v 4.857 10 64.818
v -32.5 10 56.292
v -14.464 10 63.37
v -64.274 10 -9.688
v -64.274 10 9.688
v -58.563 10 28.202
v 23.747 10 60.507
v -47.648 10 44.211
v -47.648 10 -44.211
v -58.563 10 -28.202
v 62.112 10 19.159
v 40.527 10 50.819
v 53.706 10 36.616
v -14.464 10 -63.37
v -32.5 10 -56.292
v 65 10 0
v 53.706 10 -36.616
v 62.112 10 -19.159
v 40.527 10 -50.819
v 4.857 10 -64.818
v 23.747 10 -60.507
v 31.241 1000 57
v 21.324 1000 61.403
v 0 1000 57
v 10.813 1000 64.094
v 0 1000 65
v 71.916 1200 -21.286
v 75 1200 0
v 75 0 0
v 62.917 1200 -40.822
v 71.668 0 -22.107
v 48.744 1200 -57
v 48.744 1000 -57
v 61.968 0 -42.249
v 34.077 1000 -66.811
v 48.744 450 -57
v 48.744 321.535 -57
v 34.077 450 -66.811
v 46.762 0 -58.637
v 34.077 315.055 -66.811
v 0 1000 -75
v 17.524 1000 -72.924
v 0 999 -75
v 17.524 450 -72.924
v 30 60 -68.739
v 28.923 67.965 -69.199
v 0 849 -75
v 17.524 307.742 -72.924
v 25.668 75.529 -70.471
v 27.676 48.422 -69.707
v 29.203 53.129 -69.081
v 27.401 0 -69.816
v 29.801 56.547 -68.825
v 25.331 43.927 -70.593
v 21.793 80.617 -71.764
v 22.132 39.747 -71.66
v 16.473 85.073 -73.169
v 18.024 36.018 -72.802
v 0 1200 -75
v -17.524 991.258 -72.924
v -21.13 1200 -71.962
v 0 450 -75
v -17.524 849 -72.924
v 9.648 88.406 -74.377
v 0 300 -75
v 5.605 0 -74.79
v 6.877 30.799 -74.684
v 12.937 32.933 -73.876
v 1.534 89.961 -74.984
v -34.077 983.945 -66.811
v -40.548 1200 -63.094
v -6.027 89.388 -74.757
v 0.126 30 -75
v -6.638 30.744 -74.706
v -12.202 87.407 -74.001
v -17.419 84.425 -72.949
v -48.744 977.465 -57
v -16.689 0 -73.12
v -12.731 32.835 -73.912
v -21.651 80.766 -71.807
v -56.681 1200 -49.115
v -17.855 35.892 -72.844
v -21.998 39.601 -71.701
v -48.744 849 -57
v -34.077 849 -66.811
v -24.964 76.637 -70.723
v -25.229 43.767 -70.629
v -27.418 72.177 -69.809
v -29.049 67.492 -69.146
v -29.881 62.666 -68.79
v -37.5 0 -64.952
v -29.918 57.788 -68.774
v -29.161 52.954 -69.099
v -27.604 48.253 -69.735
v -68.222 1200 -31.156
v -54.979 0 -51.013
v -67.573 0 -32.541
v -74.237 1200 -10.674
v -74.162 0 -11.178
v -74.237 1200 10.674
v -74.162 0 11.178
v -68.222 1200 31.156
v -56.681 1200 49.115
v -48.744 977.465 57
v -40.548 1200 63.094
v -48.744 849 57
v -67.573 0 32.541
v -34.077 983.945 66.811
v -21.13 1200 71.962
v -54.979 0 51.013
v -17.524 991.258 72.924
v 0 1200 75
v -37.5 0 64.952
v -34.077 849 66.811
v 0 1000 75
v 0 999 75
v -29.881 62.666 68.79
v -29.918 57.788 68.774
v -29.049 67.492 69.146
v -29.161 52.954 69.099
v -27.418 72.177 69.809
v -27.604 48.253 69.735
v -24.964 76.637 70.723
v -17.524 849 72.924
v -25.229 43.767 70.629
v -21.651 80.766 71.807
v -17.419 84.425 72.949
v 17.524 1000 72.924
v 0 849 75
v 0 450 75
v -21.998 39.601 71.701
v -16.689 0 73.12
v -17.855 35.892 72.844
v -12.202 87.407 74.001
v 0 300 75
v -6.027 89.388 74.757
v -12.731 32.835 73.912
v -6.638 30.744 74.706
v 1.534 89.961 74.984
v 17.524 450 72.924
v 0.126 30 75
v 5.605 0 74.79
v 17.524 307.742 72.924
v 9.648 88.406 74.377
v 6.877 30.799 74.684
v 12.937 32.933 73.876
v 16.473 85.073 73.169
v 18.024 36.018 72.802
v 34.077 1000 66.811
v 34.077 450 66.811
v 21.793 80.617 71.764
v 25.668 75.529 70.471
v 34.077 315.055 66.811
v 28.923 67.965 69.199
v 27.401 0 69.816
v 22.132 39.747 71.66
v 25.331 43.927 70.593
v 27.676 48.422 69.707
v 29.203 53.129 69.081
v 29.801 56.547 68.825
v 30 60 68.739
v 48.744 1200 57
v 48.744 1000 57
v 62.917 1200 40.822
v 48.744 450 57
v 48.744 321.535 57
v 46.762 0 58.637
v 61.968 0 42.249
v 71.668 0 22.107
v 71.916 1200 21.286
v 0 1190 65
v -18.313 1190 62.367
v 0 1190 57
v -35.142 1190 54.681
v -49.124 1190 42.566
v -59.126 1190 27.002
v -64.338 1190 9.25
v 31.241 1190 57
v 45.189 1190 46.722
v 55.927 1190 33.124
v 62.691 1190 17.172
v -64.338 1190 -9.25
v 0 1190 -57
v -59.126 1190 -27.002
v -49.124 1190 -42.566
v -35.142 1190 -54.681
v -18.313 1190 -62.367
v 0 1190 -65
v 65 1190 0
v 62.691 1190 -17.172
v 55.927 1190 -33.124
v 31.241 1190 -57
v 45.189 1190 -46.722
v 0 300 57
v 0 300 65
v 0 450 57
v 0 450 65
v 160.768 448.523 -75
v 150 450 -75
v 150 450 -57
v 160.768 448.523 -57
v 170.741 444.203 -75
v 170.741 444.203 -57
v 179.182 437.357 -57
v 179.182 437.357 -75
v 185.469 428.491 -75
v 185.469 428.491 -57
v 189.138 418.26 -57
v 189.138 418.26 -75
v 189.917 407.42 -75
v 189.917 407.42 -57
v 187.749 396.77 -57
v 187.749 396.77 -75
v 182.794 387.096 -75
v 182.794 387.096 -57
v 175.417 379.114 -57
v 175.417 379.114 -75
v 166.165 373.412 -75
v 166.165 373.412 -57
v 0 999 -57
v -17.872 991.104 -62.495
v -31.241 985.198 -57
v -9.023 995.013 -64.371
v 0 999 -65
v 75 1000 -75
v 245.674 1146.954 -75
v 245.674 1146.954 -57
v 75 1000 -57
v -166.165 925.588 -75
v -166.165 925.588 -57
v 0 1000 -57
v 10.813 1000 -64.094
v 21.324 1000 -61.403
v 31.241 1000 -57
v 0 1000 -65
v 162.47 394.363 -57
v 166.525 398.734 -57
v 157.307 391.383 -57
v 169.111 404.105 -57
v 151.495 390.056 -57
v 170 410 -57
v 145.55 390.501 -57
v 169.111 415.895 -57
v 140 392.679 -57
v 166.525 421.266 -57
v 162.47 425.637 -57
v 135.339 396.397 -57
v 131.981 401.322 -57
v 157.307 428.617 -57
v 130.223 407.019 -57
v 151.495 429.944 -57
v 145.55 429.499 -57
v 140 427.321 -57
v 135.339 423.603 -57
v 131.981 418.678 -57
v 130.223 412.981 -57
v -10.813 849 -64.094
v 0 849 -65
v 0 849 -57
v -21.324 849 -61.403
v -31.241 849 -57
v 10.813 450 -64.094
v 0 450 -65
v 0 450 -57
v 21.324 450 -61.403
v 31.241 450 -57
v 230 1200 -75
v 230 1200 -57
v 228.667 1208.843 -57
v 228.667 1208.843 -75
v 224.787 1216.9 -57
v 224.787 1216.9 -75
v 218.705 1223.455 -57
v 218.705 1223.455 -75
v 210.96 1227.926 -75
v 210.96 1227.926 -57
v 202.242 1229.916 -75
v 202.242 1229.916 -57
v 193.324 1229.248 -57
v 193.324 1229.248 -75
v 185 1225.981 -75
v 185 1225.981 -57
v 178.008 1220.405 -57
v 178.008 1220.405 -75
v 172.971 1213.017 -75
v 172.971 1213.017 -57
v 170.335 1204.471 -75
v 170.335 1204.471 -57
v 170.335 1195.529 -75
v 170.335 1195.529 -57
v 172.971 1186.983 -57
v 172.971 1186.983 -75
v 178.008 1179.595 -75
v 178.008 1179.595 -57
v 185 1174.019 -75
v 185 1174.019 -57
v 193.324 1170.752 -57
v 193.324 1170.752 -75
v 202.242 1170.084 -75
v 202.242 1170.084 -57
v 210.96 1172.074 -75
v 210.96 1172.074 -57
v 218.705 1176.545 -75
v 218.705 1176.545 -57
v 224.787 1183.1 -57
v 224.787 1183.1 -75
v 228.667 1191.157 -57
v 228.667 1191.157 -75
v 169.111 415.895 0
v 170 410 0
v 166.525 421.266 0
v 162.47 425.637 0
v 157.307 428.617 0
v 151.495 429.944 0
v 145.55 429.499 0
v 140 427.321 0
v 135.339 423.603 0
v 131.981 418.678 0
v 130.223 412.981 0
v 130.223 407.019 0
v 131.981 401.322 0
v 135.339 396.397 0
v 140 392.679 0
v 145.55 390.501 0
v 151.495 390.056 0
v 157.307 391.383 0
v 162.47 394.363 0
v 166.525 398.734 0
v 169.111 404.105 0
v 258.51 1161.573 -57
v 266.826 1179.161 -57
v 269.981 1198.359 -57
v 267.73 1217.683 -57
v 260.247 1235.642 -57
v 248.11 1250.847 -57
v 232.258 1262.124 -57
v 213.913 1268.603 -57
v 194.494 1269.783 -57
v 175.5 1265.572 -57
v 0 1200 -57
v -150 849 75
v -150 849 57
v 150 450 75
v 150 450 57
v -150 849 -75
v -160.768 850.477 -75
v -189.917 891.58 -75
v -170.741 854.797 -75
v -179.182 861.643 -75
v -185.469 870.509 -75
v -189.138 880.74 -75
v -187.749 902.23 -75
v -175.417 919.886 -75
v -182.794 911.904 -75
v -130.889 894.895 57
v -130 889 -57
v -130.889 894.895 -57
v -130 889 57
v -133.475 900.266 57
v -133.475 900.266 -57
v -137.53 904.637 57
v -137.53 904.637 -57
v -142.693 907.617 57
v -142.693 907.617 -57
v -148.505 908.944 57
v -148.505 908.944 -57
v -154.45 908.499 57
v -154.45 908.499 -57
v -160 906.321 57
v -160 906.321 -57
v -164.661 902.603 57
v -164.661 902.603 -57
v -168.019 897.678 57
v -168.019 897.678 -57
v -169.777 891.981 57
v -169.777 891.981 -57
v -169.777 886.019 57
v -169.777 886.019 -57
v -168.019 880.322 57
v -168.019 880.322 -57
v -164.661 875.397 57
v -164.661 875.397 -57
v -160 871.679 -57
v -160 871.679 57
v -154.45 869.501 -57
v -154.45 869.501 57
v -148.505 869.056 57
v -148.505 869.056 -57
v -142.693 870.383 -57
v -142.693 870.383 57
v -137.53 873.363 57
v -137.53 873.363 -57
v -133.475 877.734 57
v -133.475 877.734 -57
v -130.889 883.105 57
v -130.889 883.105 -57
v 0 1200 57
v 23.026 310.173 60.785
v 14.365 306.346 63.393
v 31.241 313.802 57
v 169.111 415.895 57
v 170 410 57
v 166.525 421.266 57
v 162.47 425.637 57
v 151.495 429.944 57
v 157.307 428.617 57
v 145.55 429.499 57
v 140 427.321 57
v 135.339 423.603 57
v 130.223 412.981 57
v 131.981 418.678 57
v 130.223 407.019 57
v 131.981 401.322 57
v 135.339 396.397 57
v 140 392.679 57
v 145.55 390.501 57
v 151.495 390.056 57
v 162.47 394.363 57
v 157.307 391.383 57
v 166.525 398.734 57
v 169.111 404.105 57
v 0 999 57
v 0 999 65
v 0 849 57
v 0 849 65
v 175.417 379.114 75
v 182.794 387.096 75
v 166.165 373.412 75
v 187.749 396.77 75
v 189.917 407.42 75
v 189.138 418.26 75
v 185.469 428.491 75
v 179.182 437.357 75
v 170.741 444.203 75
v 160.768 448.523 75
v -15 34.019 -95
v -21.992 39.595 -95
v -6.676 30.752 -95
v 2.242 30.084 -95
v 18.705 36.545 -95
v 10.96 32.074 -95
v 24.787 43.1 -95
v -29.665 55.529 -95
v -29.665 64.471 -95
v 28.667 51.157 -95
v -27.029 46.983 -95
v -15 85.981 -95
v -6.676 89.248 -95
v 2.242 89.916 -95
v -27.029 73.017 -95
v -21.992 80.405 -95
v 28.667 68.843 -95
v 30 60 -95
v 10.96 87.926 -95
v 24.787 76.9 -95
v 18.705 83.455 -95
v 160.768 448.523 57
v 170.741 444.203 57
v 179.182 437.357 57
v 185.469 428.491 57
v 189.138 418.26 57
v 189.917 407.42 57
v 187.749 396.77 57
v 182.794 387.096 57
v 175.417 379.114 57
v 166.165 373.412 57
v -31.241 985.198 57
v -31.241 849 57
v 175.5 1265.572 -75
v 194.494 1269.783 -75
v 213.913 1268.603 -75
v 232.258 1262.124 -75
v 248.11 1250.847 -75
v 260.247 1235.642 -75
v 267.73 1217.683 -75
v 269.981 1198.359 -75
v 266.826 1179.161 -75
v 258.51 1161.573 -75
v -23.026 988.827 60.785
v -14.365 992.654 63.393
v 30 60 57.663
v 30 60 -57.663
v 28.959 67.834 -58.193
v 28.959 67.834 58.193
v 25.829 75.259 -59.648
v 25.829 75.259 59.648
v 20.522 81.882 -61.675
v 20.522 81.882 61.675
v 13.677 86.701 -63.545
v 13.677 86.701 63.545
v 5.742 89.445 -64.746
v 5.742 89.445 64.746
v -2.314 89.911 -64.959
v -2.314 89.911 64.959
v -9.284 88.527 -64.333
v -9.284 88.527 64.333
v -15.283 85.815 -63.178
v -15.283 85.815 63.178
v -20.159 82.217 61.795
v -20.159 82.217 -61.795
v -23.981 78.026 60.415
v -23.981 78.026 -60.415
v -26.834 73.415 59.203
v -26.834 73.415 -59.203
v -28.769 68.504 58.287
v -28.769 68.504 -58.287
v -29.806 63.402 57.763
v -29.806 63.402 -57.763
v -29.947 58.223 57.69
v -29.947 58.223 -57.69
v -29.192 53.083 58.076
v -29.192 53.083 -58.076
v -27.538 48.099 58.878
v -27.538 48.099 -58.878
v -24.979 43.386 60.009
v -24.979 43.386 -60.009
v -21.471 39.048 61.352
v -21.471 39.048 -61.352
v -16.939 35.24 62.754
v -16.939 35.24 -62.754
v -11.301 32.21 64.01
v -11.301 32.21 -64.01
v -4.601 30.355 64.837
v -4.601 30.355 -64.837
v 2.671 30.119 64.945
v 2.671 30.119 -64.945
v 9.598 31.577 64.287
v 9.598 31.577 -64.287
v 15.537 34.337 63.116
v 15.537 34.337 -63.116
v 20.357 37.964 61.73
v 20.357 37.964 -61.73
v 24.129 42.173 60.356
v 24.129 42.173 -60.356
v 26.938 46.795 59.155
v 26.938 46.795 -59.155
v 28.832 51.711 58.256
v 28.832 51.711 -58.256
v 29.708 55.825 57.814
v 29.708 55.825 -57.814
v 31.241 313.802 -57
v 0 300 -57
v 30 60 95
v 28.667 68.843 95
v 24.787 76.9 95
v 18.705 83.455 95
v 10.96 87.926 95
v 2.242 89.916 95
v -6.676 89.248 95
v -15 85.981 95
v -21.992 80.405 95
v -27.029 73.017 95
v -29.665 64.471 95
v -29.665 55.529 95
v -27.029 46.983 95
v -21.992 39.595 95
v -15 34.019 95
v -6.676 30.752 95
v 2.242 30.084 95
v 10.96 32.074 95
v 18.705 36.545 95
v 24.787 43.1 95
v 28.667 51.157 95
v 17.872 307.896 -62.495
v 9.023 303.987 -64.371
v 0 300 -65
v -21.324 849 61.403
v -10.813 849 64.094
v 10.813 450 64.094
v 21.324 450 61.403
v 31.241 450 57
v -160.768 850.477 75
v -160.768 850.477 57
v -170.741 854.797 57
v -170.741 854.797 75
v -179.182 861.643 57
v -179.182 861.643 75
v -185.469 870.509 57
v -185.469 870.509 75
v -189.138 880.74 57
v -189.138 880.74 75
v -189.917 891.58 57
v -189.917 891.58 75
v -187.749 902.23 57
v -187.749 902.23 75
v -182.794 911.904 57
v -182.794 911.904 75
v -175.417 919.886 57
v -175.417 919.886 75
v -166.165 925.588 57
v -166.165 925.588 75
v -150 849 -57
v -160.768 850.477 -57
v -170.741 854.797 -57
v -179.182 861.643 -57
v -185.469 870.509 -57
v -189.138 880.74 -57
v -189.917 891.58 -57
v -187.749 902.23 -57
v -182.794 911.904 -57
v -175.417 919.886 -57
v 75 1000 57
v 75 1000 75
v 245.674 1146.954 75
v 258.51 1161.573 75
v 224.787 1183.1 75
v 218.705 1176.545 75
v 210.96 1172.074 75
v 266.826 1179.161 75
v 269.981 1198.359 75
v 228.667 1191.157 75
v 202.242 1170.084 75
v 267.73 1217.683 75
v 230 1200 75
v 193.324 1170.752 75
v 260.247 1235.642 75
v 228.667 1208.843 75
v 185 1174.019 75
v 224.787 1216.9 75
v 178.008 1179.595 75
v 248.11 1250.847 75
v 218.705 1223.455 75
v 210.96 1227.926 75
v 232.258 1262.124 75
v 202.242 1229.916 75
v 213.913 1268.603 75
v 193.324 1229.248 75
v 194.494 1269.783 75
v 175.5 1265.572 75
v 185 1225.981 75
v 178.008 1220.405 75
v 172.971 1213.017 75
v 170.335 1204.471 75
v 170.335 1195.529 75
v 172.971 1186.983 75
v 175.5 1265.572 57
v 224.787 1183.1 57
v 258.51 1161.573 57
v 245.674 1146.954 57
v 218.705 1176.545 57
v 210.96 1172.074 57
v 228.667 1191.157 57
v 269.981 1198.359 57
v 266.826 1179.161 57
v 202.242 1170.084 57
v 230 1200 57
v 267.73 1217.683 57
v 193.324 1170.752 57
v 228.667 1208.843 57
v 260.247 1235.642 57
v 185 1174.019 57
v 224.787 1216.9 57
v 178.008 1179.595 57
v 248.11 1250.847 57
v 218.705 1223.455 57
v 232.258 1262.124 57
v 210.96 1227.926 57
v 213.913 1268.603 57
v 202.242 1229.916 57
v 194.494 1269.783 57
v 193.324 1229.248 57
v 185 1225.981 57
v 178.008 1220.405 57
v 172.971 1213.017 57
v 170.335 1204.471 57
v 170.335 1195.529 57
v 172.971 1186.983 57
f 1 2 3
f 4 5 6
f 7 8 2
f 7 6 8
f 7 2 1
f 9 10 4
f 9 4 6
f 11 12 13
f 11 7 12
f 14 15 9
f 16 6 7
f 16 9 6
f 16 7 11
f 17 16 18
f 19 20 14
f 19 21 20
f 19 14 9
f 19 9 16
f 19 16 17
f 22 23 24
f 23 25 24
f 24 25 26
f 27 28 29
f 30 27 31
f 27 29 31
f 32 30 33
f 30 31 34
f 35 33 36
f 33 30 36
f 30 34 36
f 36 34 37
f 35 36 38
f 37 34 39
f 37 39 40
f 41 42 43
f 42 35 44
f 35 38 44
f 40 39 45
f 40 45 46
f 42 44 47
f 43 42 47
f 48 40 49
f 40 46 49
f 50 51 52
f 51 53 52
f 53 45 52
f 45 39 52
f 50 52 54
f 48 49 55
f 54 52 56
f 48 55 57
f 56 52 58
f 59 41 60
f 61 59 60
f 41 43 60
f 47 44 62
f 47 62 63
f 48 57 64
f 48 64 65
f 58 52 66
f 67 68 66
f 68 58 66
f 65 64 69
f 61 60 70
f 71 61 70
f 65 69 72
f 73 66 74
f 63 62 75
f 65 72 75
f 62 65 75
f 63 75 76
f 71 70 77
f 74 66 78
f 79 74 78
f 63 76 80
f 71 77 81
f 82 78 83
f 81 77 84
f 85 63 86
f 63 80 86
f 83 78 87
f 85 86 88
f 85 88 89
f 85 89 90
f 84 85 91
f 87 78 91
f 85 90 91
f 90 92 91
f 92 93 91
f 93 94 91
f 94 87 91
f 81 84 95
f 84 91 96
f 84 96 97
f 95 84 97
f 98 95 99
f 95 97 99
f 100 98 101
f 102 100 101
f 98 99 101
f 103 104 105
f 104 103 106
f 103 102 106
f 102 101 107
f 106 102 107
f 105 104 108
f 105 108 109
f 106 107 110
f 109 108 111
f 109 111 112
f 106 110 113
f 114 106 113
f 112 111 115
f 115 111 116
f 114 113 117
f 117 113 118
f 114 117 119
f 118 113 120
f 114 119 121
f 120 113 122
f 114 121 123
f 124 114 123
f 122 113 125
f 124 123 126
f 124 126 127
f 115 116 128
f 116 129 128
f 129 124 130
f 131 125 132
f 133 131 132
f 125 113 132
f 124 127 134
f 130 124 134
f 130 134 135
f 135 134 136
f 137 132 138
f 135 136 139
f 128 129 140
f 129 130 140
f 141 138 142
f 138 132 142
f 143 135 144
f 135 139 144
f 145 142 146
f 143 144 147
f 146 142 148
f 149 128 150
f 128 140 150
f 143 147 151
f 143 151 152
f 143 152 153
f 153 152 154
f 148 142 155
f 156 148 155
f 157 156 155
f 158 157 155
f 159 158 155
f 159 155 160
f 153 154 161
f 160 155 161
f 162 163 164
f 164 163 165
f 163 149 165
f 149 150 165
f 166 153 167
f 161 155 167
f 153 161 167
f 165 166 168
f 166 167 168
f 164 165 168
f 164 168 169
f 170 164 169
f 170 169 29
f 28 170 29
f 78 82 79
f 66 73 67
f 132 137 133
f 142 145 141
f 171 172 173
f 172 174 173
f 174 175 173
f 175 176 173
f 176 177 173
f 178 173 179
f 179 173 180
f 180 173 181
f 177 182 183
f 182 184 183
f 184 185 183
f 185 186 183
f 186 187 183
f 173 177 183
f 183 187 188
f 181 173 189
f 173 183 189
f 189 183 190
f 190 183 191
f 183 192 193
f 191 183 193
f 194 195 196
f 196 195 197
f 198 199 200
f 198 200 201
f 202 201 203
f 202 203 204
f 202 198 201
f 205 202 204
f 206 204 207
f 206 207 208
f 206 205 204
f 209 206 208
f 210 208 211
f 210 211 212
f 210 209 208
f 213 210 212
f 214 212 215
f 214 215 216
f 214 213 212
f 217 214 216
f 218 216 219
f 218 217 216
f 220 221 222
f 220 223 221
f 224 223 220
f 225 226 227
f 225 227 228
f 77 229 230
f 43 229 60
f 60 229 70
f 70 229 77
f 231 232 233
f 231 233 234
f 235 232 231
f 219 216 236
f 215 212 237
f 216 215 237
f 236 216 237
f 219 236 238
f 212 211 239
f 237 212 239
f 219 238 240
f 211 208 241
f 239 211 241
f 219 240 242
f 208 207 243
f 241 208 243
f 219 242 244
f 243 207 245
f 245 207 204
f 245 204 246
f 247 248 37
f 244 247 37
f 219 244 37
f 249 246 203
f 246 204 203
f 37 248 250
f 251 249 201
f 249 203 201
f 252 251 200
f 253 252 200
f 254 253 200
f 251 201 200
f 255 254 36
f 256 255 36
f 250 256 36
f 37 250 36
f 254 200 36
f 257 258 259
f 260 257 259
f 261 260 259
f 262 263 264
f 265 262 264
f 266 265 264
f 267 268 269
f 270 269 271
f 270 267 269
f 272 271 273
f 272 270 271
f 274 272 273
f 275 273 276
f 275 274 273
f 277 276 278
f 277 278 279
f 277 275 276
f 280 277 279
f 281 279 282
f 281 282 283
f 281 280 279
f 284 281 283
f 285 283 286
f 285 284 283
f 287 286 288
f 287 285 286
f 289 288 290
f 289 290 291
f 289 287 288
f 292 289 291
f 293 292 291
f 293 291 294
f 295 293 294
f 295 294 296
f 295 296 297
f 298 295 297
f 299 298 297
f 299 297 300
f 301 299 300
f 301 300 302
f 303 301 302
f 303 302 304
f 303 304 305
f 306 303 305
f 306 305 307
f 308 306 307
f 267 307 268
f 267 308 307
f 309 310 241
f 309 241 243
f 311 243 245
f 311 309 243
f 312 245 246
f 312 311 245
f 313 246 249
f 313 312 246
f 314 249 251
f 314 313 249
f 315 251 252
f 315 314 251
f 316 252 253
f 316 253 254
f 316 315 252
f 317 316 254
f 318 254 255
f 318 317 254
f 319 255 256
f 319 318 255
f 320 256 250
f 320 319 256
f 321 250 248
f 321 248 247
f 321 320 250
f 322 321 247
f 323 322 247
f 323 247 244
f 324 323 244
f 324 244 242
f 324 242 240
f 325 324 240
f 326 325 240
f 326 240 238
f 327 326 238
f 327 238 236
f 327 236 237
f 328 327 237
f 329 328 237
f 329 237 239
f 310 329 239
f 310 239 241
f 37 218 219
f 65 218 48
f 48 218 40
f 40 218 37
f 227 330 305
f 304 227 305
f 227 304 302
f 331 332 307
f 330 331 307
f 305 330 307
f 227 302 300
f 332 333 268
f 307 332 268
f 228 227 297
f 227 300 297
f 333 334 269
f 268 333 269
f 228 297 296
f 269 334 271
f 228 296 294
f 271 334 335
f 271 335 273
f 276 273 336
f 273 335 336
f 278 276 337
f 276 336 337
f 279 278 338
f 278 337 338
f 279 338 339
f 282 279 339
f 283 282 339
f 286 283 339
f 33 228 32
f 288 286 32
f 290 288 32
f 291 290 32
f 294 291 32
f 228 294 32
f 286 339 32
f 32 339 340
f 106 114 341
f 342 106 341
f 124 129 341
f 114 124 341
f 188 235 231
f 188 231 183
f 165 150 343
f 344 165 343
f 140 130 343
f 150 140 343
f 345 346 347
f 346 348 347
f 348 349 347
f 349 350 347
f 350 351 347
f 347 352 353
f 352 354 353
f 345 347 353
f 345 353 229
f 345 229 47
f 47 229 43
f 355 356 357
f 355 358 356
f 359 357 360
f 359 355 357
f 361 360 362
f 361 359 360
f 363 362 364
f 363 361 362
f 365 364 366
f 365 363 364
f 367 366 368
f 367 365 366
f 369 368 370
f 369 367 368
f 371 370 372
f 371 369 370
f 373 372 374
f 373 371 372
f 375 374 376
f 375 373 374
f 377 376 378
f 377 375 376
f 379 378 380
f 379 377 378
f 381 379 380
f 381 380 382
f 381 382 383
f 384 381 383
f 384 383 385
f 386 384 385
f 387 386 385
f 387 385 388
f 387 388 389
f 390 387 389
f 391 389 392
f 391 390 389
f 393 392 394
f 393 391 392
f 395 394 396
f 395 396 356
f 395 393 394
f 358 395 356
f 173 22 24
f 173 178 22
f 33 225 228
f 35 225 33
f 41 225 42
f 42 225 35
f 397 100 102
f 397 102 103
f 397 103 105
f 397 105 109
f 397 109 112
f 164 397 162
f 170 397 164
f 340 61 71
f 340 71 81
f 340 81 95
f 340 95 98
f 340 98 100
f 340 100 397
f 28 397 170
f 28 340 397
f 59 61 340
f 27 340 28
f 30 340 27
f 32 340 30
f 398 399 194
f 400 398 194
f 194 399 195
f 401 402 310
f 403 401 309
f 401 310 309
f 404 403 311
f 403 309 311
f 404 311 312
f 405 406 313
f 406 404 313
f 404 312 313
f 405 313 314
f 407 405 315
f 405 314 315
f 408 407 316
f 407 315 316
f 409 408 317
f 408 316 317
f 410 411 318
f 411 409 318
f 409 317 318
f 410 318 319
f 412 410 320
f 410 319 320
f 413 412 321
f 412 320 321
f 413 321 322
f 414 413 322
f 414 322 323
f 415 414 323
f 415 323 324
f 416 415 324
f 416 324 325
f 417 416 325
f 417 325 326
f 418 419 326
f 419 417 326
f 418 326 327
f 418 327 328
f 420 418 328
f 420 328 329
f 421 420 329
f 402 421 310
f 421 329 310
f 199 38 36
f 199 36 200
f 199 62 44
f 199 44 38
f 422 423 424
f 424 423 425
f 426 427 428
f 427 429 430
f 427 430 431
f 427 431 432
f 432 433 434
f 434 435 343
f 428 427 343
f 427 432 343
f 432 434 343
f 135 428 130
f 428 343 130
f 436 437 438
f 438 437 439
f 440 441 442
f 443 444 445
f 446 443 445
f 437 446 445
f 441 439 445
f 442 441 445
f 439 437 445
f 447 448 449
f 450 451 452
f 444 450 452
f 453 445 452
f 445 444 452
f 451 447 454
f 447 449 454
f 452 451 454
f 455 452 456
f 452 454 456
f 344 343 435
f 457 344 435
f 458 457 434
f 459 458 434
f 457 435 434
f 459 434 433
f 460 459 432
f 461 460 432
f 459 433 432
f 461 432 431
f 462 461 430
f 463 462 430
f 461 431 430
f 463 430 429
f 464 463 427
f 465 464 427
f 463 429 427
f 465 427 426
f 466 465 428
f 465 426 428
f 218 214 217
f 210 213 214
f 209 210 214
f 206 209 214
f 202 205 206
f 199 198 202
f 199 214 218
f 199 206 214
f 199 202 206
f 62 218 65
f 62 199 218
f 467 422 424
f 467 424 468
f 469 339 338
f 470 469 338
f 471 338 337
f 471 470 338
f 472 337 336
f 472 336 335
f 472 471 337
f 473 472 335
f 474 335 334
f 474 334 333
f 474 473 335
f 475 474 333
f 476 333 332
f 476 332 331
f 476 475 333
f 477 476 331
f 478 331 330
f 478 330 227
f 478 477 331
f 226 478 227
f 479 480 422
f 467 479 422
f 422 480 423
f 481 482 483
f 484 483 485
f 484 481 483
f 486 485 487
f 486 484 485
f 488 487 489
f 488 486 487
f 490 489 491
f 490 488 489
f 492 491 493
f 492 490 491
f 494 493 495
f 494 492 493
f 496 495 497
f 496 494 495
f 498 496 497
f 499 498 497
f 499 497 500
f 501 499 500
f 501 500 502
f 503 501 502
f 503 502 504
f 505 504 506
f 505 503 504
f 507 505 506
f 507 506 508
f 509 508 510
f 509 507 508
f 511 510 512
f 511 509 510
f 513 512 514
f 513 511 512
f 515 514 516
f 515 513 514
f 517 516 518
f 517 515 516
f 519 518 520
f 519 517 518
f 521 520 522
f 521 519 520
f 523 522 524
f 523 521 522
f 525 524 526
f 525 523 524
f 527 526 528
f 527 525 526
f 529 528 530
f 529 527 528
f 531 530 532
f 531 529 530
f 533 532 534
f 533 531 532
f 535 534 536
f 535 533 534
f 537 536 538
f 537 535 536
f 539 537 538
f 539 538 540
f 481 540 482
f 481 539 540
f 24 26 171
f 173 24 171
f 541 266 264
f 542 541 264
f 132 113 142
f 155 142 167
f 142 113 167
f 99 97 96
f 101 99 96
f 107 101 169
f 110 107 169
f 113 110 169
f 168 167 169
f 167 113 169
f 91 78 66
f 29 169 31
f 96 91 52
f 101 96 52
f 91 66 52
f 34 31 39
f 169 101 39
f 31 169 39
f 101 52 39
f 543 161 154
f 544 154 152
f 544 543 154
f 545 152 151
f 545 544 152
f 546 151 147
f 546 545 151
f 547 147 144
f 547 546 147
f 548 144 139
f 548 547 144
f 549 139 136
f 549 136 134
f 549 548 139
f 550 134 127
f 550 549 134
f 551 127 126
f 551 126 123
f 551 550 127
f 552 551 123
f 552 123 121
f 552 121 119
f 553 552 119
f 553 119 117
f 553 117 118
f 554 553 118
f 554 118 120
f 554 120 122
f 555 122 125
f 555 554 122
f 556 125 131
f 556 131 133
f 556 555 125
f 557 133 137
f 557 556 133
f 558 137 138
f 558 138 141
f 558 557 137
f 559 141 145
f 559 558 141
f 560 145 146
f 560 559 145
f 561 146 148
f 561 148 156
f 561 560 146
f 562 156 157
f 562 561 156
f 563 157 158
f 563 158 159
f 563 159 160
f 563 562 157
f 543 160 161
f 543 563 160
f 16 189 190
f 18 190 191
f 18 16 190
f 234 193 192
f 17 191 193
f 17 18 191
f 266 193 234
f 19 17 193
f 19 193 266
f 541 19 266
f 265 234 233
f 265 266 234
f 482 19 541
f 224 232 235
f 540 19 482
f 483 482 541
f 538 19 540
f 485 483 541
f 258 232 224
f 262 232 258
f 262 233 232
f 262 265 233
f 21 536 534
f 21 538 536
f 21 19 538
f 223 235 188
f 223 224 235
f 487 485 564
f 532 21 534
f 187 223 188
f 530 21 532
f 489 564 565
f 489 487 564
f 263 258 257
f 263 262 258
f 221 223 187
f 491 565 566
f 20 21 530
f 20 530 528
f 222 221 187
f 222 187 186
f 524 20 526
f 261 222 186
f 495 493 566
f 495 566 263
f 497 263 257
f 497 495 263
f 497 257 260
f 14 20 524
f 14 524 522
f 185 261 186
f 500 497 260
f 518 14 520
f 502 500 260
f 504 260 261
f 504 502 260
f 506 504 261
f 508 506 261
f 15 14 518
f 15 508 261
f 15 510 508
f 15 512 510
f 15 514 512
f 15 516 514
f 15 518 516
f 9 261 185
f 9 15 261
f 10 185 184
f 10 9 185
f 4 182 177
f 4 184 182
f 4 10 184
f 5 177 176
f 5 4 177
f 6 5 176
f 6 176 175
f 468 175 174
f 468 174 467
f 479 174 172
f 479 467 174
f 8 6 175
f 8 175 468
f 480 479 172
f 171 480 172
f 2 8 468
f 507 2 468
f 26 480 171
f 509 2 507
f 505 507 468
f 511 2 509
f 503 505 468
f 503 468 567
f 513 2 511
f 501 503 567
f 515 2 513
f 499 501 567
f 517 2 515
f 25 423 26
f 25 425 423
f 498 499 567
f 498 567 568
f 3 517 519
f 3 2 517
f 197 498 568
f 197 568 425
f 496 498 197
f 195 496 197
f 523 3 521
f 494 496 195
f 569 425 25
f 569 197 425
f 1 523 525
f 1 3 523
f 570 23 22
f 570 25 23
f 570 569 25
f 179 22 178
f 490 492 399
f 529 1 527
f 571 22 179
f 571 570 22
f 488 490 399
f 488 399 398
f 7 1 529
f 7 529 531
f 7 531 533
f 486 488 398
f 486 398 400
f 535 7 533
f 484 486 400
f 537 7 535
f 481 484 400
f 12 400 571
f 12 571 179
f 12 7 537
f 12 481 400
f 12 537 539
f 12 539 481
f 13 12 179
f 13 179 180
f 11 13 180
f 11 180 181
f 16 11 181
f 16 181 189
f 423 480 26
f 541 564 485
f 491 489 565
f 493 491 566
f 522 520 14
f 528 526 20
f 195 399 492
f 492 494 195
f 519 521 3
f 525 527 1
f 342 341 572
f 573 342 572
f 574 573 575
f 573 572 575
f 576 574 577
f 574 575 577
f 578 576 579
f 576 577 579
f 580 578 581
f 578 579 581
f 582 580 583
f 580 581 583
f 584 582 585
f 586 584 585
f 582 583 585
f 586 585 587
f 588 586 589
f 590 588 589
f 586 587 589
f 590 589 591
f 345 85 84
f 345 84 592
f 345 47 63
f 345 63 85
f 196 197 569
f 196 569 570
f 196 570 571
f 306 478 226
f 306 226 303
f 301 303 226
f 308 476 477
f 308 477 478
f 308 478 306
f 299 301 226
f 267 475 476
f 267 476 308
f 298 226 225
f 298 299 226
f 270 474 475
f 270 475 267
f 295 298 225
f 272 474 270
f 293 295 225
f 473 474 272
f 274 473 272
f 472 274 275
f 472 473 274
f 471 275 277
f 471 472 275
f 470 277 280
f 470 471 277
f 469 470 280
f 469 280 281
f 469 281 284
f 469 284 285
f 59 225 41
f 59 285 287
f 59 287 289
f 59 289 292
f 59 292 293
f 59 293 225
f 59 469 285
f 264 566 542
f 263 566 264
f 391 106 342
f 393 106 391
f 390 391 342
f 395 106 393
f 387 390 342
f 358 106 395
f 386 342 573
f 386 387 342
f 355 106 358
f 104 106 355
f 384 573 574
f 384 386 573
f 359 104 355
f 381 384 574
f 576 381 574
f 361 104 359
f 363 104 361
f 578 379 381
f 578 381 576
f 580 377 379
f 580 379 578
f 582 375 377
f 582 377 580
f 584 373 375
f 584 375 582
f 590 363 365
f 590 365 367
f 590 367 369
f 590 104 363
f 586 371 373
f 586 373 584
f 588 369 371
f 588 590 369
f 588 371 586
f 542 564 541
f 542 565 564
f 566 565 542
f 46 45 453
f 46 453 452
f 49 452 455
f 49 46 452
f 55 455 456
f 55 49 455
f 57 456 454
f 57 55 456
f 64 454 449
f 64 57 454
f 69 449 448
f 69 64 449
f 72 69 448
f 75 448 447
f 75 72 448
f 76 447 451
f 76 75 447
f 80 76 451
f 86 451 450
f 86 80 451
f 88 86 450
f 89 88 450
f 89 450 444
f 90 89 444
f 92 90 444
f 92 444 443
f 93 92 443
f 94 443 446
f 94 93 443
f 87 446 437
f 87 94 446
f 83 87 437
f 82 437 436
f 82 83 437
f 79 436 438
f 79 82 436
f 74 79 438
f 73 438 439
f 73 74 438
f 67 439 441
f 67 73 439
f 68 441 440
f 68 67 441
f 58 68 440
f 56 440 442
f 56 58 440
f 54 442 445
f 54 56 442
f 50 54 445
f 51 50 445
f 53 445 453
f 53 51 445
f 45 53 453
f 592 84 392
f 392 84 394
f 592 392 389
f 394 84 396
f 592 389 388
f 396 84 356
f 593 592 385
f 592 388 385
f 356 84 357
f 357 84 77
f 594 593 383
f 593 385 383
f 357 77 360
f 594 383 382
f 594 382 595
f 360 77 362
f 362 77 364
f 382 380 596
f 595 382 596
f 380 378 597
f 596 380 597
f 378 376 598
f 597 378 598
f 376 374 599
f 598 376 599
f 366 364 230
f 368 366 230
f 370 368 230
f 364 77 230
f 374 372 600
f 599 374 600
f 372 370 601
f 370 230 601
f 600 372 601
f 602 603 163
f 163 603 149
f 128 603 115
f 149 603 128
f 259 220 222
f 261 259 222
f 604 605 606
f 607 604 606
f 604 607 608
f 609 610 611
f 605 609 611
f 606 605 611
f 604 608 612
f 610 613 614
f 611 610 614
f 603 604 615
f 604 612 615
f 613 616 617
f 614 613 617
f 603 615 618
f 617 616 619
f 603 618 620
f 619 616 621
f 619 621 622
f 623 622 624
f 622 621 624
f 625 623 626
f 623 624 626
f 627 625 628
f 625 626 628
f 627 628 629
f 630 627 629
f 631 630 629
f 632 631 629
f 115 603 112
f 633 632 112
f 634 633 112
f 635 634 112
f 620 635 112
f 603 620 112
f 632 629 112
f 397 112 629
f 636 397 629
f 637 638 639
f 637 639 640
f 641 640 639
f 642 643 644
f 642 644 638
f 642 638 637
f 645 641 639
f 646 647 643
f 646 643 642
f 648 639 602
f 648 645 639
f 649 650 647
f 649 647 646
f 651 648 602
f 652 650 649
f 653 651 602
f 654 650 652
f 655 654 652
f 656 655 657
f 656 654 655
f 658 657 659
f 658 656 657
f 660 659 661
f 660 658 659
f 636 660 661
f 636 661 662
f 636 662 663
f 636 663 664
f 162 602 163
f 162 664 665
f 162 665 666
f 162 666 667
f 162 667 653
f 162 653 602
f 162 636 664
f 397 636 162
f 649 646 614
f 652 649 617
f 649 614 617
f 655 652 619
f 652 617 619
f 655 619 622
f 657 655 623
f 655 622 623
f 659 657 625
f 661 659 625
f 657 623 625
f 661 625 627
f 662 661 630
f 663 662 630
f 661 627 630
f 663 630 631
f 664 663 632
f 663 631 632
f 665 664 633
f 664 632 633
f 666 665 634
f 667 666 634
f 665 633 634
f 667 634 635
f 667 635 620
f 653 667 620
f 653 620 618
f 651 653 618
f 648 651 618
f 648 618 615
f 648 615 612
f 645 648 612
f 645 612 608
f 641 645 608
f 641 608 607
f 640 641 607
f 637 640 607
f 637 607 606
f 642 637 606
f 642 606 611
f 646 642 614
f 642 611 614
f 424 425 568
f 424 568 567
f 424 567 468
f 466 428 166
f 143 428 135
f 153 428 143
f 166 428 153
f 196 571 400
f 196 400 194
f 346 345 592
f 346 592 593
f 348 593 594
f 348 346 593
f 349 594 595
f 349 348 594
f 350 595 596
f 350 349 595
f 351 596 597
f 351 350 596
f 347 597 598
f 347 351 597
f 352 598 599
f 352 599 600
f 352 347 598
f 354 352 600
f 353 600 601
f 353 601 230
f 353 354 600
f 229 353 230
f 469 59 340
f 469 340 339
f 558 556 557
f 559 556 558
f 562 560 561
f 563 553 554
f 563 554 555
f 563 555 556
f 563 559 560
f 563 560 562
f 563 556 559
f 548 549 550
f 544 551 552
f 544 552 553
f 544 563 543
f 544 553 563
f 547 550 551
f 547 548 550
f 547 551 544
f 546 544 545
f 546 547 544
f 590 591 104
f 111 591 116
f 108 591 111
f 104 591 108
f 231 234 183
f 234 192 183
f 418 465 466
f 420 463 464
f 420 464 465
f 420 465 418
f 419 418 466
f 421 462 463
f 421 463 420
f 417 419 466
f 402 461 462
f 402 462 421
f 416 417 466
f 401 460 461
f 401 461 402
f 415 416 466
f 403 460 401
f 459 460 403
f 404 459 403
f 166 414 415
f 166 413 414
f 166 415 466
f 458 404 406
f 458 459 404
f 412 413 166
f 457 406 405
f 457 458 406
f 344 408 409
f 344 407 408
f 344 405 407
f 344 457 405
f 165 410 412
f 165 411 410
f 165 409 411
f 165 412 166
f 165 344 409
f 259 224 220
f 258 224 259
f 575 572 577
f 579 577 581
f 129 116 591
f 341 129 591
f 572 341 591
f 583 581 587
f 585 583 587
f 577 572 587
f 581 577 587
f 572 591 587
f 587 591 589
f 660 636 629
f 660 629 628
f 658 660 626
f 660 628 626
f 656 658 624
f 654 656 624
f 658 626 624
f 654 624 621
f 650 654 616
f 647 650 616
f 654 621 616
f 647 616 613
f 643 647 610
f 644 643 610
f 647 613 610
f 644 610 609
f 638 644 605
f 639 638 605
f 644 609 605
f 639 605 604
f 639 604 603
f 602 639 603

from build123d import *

# Parameters (mm, degrees)
SKETCH2_R           = 75
BOSS_EXTRUDE1_DEPTH = 1200
SHELL4_T            = 10
BOSS_EXTRUDE2_START = 75
SKETCH3_R           = 30
BOSS_EXTRUDE2_DEPTH = 18
SKETCH10_R          = 30
BOSS_EXTRUDE3_DEPTH = 95
SKETCH12_R          = 20
BOSS_EXTRUDE4_DEPTH = 75


with BuildPart() as part:
    # Sketch2 → Boss-Extrude1 (new body)
    with BuildSketch(Plane(origin=(0, 0, 0), x_dir=(1, 0, 0), z_dir=(0, 1, 0))):
        Circle(SKETCH2_R)
    extrude(amount=BOSS_EXTRUDE1_DEPTH)

    # Shell4 (no face opened: a closed hollow body)
    add(offset(amount=-SHELL4_T, mode=Mode.PRIVATE), mode=Mode.SUBTRACT)

    # Sketch3 → Boss-Extrude2 (add)
    with BuildSketch(Plane.XY.offset(BOSS_EXTRUDE2_START)):
        with BuildLine():
            Line((0, 450), (150, 450))
            ThreePointArc((150, 450), (189.137774485, 418.260424226), (166.164731025, 373.41173042))
            Line((166.164731025, 373.41173042), (0, 300))
            Line((0, 300), (0, 450))
        make_face()
        with BuildLine():
            Line((0, 999), (0, 849))
            Line((0, 849), (-150, 849))
            ThreePointArc((-150, 849), (-189.137774485, 880.739575774), (-166.164731025, 925.58826958))
            Line((-166.164731025, 925.58826958), (0, 999))
        make_face()
        with BuildLine():
            Line((0, 1000), (0, 1200))
            Line((0, 1200), (175.5, 1265.572478983))
            ThreePointArc((175.5, 1265.572478983), (260.246822056, 1235.64155485), (245.673880023, 1146.953824986))
            Line((245.673880023, 1146.953824986), (75, 1000))
            Line((75, 1000), (0, 1000))
        make_face()
        with Locations((200, 1200)):
            Circle(SKETCH3_R, mode=Mode.SUBTRACT)
    boss_extrude2 = extrude(amount=-BOSS_EXTRUDE2_DEPTH)

    # Mirror11: Boss-Extrude2 across plane
    add(boss_extrude2.mirror(Plane(origin=(0, 0, 0), x_dir=(1, 0, 0), z_dir=(0, 0, -1))))

    # Sketch10 → Boss-Extrude3 (add, symmetric)
    with BuildSketch(Plane.XY):
        with Locations((0, 60)):
            Circle(SKETCH10_R)
    extrude(amount=BOSS_EXTRUDE3_DEPTH, both=True)

    # Sketch12 → Boss-Extrude4 (add, symmetric)
    with BuildSketch(Plane.XY):
        with Locations((150, 410)):
            Circle(SKETCH12_R)
        with Locations((-150, 889)):
            Circle(SKETCH12_R)
    extrude(amount=BOSS_EXTRUDE4_DEPTH, both=True)


solid = part.part
